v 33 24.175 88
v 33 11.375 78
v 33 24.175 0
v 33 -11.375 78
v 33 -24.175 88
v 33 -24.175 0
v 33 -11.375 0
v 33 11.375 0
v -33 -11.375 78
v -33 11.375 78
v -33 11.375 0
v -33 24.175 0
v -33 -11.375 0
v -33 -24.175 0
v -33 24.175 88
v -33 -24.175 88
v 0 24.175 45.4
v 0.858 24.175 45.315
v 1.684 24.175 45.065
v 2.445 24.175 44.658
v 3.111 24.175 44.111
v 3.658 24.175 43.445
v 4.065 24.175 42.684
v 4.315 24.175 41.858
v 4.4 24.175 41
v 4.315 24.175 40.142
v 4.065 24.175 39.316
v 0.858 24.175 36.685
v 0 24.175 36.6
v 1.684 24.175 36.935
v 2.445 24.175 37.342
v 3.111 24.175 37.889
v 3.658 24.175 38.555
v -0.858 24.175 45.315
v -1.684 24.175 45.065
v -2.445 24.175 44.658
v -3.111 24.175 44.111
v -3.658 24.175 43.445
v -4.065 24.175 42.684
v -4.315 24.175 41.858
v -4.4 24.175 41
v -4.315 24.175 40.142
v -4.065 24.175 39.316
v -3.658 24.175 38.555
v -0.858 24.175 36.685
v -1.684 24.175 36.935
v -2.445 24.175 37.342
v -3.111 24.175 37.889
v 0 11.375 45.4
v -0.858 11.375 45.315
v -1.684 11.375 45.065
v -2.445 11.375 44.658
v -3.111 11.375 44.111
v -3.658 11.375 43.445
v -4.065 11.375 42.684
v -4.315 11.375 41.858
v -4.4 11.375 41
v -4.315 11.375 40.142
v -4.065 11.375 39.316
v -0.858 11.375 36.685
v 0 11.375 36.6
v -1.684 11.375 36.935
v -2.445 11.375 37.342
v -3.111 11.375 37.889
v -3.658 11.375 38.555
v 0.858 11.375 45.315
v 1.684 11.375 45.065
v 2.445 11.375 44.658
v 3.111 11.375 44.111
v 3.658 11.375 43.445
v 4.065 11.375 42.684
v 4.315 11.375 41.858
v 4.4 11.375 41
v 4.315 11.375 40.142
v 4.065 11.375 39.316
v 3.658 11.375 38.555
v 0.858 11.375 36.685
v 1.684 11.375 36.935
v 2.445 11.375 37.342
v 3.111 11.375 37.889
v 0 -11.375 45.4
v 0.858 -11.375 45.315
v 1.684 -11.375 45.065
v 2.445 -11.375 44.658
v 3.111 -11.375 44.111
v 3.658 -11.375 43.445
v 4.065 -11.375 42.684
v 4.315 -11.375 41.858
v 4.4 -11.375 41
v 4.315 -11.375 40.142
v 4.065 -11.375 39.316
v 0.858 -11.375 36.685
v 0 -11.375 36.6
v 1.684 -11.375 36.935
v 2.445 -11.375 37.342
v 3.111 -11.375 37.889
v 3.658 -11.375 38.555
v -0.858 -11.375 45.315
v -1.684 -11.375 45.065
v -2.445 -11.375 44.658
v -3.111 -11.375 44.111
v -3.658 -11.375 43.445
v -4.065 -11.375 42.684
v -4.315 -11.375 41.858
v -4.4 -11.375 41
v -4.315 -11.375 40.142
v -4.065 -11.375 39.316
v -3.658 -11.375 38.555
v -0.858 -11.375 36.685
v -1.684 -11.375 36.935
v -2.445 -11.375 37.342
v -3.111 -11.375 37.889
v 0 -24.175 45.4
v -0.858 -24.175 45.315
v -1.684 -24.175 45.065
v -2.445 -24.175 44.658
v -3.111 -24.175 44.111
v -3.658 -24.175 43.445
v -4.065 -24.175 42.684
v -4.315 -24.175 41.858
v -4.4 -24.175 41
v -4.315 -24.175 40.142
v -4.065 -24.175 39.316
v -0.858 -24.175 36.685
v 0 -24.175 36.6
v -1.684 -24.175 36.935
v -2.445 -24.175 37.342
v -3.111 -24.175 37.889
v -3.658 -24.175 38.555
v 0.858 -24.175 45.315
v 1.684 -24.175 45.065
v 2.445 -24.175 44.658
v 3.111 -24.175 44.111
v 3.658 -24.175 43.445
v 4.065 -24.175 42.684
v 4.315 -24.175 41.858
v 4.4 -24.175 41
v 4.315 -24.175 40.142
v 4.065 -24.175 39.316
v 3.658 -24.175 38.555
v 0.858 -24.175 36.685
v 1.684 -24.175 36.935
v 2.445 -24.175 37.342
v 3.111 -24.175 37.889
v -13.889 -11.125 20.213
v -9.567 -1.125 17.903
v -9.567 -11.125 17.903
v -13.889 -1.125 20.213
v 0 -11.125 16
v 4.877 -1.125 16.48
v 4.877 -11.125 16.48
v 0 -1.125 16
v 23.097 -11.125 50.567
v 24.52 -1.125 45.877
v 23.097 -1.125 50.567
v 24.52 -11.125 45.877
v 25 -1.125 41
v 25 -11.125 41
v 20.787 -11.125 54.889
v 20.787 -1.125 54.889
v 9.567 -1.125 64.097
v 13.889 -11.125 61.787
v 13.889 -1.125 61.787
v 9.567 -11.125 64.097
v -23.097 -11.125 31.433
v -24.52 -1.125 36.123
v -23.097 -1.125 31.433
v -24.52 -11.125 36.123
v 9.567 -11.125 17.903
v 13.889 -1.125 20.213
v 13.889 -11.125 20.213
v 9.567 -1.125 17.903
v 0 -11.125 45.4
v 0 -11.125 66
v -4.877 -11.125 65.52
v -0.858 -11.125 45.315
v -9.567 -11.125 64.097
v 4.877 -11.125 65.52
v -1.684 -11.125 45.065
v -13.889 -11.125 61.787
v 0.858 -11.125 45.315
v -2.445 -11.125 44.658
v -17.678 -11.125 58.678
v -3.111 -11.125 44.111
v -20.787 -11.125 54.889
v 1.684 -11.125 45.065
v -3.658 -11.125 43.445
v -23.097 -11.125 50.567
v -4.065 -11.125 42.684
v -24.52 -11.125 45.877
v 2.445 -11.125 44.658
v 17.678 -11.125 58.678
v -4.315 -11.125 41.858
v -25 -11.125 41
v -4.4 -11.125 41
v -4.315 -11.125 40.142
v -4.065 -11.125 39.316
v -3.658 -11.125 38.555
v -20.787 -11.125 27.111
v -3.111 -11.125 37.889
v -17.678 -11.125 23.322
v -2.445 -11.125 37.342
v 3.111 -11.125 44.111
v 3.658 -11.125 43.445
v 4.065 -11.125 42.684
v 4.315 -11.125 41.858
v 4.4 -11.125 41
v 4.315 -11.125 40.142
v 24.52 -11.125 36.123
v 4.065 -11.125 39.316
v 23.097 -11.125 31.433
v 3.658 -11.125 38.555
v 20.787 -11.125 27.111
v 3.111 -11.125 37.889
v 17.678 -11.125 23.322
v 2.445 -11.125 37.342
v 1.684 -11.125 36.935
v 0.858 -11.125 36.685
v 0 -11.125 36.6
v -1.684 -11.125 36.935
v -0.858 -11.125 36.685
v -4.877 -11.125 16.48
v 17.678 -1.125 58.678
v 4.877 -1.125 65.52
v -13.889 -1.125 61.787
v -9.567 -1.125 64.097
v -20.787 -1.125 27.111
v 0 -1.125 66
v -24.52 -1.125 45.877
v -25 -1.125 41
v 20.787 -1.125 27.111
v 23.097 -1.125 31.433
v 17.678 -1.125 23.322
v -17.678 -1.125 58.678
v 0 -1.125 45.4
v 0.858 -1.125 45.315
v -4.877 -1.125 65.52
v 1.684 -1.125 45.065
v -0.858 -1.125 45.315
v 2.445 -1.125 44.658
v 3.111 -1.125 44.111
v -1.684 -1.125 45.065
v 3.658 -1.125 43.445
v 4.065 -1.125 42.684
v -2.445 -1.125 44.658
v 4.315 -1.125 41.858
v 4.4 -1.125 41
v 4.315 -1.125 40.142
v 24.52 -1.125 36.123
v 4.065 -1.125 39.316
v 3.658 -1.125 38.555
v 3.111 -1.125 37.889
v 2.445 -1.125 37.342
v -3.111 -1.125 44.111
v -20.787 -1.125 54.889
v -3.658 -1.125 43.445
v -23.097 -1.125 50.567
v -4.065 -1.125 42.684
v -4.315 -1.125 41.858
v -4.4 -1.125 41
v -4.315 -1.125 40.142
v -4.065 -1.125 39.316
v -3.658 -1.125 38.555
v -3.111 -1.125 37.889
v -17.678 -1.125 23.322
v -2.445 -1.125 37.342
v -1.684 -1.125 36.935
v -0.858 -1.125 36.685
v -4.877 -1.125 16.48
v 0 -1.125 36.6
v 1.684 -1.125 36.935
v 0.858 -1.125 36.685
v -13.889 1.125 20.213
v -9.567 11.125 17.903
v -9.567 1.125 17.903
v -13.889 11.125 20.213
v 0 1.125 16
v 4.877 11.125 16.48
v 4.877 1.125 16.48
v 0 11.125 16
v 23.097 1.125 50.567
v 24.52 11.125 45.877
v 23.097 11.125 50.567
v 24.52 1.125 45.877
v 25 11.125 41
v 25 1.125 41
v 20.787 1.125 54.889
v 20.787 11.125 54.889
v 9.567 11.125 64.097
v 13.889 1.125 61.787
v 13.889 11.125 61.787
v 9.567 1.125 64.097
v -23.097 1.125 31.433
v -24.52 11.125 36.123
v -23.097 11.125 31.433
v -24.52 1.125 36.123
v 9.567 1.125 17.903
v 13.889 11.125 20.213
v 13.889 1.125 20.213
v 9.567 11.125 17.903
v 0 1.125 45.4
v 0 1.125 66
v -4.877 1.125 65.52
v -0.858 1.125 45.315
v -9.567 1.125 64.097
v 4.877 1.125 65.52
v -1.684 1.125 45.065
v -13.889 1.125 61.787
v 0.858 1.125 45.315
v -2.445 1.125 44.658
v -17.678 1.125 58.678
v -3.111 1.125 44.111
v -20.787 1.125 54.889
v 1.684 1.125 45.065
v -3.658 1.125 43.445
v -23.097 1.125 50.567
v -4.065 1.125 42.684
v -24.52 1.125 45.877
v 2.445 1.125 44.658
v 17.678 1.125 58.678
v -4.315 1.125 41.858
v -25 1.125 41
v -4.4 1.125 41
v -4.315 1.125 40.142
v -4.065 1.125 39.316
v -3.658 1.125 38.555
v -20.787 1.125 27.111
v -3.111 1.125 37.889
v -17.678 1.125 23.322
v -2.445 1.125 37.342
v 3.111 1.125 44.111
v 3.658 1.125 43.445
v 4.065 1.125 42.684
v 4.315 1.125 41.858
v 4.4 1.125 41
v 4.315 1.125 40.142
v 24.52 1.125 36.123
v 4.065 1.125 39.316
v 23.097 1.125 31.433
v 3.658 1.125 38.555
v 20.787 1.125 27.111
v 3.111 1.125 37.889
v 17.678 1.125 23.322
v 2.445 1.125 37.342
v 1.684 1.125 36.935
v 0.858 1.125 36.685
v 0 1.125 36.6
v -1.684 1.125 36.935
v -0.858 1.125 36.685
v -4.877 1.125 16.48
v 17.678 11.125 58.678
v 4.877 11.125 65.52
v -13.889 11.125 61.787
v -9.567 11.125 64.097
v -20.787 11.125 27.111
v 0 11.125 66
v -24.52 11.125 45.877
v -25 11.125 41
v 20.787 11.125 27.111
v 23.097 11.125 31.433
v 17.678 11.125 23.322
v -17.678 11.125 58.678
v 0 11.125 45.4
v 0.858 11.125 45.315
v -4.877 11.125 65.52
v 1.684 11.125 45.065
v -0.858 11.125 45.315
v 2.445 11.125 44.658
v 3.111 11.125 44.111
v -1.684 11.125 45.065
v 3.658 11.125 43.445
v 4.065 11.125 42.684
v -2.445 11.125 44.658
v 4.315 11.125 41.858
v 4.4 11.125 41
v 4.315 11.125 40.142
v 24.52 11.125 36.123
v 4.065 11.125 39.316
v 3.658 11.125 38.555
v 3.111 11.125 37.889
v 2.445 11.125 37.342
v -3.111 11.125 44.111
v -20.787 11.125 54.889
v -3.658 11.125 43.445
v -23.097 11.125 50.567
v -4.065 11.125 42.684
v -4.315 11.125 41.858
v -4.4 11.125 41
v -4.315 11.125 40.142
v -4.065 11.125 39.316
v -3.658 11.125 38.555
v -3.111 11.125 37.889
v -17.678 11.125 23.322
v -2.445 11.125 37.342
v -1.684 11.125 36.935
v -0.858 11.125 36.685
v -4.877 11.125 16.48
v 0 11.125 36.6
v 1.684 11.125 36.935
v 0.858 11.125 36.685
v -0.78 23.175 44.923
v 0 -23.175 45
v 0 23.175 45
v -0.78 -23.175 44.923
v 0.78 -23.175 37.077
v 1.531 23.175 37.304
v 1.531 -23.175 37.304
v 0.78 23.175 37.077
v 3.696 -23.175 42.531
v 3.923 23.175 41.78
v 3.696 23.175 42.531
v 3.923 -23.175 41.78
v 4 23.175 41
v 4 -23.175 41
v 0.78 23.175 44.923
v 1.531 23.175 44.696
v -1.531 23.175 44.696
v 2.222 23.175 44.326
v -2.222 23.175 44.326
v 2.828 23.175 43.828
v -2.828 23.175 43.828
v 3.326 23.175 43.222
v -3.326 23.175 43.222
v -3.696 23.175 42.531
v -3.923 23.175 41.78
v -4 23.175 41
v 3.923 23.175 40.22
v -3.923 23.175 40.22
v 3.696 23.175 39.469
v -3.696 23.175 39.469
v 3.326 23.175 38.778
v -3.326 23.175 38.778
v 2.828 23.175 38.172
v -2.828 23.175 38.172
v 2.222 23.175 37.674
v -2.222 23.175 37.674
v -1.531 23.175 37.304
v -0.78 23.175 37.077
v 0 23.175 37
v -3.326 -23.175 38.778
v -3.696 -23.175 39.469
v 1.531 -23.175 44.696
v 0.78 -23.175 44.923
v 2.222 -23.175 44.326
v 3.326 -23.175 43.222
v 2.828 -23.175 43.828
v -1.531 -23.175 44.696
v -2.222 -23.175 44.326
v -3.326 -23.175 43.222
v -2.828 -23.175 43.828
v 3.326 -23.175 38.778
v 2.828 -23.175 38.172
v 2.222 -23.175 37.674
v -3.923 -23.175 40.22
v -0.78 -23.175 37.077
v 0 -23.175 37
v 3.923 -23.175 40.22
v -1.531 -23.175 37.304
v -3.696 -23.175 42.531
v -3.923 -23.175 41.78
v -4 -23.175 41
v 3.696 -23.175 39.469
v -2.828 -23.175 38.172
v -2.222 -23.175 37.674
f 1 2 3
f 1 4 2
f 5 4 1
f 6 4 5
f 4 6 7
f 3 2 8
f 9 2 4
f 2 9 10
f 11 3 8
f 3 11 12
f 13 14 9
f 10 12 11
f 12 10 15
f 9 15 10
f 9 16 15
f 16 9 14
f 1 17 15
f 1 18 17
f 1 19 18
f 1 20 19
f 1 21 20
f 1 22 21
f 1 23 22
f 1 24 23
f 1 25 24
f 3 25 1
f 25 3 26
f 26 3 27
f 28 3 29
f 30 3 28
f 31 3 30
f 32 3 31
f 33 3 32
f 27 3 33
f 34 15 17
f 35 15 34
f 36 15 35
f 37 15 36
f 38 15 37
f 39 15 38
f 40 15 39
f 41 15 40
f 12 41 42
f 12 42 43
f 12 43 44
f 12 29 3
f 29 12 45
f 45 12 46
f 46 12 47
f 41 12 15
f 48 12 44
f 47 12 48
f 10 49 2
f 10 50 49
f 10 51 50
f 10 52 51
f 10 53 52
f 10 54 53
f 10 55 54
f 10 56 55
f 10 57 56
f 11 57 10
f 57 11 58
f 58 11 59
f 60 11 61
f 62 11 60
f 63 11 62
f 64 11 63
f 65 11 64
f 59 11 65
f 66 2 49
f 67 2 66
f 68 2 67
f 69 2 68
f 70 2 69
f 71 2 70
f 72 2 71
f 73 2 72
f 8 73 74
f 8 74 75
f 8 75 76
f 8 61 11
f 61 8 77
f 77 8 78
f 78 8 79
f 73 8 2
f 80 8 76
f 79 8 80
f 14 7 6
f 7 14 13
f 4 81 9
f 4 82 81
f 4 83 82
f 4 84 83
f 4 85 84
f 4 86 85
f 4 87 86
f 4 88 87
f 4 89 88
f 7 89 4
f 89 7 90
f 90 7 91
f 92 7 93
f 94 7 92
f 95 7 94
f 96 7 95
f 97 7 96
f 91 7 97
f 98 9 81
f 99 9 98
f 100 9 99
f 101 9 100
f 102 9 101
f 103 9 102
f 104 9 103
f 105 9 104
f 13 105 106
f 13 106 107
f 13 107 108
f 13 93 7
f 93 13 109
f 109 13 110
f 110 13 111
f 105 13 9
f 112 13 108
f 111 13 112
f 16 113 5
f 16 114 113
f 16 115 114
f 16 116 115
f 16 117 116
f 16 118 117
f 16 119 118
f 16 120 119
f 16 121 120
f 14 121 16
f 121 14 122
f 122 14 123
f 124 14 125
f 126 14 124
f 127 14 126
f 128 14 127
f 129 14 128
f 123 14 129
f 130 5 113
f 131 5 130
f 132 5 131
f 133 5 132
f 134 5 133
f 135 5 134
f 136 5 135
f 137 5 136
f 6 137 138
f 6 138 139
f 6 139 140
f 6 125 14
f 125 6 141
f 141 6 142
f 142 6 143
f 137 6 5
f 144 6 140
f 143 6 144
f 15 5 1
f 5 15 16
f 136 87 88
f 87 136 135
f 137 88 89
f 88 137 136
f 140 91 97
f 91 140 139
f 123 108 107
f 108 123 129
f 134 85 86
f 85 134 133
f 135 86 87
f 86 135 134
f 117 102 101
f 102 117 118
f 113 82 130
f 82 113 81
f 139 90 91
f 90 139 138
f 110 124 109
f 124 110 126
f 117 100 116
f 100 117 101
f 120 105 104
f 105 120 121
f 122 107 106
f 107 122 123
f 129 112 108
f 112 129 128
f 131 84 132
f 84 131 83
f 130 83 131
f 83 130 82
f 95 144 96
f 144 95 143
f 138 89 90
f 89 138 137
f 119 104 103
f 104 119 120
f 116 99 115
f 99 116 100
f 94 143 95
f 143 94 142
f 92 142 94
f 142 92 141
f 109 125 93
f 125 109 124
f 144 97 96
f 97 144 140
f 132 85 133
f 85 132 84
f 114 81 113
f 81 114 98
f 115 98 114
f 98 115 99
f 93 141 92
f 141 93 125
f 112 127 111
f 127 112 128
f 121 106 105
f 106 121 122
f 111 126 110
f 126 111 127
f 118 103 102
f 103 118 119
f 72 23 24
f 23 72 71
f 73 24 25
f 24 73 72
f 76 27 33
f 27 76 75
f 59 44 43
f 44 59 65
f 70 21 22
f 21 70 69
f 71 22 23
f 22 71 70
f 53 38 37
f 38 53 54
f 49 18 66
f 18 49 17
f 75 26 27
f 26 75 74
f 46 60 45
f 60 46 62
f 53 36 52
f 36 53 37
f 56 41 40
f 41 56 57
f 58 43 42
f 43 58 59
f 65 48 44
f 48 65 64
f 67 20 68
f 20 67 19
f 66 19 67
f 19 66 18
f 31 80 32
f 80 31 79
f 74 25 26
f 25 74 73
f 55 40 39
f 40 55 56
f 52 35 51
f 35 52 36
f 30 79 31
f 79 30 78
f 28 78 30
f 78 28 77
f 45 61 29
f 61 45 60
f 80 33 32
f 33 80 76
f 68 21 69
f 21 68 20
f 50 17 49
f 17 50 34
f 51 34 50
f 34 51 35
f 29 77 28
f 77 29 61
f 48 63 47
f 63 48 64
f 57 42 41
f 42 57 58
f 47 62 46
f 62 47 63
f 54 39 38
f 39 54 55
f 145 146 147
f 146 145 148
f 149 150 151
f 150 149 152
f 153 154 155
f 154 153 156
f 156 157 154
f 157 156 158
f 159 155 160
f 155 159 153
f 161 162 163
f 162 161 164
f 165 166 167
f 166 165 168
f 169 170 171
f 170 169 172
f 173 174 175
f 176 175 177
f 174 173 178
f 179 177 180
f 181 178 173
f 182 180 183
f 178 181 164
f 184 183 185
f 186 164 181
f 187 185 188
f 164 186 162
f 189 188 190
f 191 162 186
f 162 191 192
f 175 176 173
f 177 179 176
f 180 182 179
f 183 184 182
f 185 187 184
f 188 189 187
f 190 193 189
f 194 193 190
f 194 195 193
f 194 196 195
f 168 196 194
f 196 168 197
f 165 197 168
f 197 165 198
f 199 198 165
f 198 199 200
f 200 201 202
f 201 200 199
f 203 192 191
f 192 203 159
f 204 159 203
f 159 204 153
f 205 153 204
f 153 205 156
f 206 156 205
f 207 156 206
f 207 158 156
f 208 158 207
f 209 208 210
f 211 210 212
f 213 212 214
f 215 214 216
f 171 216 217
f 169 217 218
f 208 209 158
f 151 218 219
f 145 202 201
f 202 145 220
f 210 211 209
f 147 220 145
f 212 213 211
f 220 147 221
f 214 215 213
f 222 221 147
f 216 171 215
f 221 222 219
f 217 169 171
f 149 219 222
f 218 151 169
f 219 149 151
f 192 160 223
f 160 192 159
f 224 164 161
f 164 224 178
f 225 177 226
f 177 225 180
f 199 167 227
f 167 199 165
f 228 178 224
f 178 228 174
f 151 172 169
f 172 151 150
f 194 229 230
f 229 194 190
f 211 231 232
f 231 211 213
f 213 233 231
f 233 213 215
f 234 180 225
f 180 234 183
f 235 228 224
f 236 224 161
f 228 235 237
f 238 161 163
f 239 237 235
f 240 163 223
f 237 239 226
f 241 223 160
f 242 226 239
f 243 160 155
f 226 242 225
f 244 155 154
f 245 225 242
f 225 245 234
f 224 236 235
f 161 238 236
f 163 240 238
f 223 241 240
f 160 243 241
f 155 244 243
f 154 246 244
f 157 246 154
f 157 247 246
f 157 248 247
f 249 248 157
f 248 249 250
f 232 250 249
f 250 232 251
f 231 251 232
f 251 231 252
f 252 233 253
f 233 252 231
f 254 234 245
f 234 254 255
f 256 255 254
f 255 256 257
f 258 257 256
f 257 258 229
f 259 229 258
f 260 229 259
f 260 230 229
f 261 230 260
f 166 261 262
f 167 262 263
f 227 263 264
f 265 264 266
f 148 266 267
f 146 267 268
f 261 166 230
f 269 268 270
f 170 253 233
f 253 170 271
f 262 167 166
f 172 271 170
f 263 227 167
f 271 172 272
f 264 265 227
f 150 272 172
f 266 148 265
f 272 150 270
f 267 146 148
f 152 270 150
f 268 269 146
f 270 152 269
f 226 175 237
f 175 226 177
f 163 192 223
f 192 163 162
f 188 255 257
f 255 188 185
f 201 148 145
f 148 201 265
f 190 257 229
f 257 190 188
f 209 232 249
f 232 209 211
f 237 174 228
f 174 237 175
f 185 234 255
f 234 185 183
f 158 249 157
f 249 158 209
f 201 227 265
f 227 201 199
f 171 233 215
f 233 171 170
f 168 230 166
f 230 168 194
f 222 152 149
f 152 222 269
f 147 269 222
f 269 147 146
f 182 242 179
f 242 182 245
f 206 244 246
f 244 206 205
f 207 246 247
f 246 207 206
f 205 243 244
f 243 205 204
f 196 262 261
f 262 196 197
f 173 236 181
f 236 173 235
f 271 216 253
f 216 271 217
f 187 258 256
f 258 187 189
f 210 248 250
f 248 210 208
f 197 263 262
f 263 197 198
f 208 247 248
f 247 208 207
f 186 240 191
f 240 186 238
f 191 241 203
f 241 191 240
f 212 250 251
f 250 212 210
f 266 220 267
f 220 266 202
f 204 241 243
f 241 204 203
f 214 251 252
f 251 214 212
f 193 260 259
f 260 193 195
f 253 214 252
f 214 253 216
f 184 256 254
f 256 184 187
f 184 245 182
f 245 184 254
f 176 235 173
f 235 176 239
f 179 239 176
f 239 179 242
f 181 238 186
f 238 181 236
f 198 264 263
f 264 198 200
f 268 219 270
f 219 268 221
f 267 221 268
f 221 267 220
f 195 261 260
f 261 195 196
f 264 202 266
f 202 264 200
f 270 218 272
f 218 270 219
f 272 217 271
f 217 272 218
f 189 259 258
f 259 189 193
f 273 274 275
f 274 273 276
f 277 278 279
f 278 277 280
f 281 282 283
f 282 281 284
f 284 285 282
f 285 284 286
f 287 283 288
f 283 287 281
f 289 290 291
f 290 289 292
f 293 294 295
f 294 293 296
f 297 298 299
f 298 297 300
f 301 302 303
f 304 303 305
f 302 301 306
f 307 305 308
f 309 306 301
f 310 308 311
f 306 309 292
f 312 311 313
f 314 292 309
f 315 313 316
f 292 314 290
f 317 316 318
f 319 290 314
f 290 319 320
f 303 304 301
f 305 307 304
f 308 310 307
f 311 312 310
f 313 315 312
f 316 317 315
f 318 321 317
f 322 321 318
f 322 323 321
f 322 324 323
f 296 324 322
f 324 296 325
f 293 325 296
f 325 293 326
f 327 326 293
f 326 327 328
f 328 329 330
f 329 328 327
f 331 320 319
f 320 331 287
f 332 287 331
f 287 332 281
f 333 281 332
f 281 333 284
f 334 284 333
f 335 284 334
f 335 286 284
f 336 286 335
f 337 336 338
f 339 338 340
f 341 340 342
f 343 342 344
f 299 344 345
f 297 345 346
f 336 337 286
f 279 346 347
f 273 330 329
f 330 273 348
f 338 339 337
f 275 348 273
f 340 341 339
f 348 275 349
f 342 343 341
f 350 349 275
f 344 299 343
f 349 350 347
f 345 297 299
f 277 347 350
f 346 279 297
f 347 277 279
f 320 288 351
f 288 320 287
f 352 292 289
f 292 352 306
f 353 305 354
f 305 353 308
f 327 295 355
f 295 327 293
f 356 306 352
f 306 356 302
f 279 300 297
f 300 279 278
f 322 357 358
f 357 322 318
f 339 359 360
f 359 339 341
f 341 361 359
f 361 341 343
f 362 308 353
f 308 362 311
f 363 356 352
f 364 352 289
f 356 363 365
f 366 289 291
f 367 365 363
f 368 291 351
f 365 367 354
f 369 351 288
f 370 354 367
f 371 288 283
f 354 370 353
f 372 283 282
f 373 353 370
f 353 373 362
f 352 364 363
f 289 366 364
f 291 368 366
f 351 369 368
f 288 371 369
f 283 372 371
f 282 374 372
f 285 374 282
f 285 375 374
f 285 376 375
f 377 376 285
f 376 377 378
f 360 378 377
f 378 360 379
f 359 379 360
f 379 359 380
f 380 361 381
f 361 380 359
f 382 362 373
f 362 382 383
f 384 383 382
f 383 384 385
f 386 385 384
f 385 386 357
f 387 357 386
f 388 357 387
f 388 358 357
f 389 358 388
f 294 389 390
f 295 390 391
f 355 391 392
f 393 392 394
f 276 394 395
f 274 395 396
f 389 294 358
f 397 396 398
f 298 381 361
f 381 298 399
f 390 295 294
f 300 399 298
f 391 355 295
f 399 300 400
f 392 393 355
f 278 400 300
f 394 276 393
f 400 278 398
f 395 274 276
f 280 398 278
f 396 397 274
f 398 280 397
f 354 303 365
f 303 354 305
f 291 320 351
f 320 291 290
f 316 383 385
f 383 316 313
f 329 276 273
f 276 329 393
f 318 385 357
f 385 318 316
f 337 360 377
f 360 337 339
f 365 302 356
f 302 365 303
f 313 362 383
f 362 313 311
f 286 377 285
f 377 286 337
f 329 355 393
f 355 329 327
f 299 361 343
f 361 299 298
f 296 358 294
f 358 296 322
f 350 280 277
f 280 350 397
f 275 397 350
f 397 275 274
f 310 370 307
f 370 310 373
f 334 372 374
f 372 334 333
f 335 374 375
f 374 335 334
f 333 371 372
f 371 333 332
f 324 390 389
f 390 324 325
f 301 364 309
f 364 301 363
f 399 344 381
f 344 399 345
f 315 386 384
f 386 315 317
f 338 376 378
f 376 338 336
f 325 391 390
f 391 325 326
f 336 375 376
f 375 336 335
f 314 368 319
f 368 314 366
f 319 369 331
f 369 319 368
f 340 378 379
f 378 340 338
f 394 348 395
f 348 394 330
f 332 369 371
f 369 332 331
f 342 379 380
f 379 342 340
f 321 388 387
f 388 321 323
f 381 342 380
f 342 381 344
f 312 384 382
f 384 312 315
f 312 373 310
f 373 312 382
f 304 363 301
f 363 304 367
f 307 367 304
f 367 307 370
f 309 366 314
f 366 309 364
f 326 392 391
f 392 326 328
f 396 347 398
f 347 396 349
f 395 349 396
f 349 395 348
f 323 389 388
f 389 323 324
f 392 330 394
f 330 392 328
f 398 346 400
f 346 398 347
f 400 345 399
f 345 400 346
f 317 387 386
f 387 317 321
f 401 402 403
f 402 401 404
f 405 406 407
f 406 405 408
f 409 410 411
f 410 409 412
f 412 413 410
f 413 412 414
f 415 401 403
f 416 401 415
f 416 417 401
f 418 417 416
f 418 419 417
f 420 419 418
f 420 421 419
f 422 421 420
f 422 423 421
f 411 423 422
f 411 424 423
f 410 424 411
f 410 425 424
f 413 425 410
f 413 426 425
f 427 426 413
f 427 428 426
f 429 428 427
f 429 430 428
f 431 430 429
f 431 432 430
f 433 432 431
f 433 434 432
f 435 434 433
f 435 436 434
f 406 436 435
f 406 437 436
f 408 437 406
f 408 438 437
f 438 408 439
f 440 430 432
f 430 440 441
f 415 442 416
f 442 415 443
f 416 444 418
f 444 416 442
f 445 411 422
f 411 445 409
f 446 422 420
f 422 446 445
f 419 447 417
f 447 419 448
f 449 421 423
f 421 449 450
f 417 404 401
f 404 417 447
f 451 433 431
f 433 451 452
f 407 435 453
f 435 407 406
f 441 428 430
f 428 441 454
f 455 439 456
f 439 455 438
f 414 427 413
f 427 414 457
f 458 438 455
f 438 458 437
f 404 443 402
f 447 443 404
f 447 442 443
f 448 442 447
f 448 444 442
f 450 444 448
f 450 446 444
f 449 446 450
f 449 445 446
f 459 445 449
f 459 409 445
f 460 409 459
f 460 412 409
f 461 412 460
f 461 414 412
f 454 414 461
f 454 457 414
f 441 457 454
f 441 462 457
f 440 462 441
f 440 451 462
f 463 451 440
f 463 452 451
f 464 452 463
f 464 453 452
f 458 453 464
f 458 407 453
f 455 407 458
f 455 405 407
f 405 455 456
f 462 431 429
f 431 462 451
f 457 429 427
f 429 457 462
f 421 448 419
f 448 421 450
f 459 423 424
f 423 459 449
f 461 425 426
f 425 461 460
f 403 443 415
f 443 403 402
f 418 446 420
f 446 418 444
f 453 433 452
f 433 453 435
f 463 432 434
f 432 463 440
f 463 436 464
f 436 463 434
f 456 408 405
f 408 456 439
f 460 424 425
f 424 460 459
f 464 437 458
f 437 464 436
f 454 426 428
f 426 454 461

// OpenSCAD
$fn = 32;

// ------------------------------------------------------------------------
// Trolley wheel set: wheels d50, fork 78 mm tall
// Every part is its own module, assembly() places every instance.
// ------------------------------------------------------------------------

// --- part 1 ---
module trolley_fork() {
  difference() {
    union() {
      translate([-33, 11.375, 0]) cube([66, 12.8, 78]);
      translate([-33, -24.175, 0]) cube([66, 12.8, 78]);
      translate([-33, -24.175, 78]) cube([66, 48.35, 10]);
    }
    translate([0, -17.775, 41]) rotate([90, 0, 0]) cylinder(h = 14.8, d = 8.8, center = true);
    translate([0, 17.775, 41]) rotate([90, 0, 0]) cylinder(h = 14.8, d = 8.8, center = true);
  }
}

// --- part 2 ---
module trolley_wheel() {
  difference() {
      translate([0, 0, 0]) cylinder(h = 10, d = 50);
      translate([0, 0, -1]) cylinder(h = 12, d = 8.8);
    }
}

// --- part 3 ---
module trolley_axle() {
  translate([0, 0, -23.175]) cylinder(h = 46.35, d = 8);
}

// --- assembly ---
module assembly() {
  color([0.80, 0.24, 0.20]) translate([0, 0, 0]) rotate([0, 0, 0]) trolley_fork();
  color([0.20, 0.45, 0.75]) translate([0, -1.125, 41]) rotate([90, 0, 0]) trolley_wheel();
  color([0.25, 0.62, 0.32]) translate([0, 11.125, 41]) rotate([90, 0, 0]) trolley_wheel();
  color([0.92, 0.70, 0.18]) translate([0, 0, 41]) rotate([90, 0, 0]) trolley_axle();
}

assembly();
